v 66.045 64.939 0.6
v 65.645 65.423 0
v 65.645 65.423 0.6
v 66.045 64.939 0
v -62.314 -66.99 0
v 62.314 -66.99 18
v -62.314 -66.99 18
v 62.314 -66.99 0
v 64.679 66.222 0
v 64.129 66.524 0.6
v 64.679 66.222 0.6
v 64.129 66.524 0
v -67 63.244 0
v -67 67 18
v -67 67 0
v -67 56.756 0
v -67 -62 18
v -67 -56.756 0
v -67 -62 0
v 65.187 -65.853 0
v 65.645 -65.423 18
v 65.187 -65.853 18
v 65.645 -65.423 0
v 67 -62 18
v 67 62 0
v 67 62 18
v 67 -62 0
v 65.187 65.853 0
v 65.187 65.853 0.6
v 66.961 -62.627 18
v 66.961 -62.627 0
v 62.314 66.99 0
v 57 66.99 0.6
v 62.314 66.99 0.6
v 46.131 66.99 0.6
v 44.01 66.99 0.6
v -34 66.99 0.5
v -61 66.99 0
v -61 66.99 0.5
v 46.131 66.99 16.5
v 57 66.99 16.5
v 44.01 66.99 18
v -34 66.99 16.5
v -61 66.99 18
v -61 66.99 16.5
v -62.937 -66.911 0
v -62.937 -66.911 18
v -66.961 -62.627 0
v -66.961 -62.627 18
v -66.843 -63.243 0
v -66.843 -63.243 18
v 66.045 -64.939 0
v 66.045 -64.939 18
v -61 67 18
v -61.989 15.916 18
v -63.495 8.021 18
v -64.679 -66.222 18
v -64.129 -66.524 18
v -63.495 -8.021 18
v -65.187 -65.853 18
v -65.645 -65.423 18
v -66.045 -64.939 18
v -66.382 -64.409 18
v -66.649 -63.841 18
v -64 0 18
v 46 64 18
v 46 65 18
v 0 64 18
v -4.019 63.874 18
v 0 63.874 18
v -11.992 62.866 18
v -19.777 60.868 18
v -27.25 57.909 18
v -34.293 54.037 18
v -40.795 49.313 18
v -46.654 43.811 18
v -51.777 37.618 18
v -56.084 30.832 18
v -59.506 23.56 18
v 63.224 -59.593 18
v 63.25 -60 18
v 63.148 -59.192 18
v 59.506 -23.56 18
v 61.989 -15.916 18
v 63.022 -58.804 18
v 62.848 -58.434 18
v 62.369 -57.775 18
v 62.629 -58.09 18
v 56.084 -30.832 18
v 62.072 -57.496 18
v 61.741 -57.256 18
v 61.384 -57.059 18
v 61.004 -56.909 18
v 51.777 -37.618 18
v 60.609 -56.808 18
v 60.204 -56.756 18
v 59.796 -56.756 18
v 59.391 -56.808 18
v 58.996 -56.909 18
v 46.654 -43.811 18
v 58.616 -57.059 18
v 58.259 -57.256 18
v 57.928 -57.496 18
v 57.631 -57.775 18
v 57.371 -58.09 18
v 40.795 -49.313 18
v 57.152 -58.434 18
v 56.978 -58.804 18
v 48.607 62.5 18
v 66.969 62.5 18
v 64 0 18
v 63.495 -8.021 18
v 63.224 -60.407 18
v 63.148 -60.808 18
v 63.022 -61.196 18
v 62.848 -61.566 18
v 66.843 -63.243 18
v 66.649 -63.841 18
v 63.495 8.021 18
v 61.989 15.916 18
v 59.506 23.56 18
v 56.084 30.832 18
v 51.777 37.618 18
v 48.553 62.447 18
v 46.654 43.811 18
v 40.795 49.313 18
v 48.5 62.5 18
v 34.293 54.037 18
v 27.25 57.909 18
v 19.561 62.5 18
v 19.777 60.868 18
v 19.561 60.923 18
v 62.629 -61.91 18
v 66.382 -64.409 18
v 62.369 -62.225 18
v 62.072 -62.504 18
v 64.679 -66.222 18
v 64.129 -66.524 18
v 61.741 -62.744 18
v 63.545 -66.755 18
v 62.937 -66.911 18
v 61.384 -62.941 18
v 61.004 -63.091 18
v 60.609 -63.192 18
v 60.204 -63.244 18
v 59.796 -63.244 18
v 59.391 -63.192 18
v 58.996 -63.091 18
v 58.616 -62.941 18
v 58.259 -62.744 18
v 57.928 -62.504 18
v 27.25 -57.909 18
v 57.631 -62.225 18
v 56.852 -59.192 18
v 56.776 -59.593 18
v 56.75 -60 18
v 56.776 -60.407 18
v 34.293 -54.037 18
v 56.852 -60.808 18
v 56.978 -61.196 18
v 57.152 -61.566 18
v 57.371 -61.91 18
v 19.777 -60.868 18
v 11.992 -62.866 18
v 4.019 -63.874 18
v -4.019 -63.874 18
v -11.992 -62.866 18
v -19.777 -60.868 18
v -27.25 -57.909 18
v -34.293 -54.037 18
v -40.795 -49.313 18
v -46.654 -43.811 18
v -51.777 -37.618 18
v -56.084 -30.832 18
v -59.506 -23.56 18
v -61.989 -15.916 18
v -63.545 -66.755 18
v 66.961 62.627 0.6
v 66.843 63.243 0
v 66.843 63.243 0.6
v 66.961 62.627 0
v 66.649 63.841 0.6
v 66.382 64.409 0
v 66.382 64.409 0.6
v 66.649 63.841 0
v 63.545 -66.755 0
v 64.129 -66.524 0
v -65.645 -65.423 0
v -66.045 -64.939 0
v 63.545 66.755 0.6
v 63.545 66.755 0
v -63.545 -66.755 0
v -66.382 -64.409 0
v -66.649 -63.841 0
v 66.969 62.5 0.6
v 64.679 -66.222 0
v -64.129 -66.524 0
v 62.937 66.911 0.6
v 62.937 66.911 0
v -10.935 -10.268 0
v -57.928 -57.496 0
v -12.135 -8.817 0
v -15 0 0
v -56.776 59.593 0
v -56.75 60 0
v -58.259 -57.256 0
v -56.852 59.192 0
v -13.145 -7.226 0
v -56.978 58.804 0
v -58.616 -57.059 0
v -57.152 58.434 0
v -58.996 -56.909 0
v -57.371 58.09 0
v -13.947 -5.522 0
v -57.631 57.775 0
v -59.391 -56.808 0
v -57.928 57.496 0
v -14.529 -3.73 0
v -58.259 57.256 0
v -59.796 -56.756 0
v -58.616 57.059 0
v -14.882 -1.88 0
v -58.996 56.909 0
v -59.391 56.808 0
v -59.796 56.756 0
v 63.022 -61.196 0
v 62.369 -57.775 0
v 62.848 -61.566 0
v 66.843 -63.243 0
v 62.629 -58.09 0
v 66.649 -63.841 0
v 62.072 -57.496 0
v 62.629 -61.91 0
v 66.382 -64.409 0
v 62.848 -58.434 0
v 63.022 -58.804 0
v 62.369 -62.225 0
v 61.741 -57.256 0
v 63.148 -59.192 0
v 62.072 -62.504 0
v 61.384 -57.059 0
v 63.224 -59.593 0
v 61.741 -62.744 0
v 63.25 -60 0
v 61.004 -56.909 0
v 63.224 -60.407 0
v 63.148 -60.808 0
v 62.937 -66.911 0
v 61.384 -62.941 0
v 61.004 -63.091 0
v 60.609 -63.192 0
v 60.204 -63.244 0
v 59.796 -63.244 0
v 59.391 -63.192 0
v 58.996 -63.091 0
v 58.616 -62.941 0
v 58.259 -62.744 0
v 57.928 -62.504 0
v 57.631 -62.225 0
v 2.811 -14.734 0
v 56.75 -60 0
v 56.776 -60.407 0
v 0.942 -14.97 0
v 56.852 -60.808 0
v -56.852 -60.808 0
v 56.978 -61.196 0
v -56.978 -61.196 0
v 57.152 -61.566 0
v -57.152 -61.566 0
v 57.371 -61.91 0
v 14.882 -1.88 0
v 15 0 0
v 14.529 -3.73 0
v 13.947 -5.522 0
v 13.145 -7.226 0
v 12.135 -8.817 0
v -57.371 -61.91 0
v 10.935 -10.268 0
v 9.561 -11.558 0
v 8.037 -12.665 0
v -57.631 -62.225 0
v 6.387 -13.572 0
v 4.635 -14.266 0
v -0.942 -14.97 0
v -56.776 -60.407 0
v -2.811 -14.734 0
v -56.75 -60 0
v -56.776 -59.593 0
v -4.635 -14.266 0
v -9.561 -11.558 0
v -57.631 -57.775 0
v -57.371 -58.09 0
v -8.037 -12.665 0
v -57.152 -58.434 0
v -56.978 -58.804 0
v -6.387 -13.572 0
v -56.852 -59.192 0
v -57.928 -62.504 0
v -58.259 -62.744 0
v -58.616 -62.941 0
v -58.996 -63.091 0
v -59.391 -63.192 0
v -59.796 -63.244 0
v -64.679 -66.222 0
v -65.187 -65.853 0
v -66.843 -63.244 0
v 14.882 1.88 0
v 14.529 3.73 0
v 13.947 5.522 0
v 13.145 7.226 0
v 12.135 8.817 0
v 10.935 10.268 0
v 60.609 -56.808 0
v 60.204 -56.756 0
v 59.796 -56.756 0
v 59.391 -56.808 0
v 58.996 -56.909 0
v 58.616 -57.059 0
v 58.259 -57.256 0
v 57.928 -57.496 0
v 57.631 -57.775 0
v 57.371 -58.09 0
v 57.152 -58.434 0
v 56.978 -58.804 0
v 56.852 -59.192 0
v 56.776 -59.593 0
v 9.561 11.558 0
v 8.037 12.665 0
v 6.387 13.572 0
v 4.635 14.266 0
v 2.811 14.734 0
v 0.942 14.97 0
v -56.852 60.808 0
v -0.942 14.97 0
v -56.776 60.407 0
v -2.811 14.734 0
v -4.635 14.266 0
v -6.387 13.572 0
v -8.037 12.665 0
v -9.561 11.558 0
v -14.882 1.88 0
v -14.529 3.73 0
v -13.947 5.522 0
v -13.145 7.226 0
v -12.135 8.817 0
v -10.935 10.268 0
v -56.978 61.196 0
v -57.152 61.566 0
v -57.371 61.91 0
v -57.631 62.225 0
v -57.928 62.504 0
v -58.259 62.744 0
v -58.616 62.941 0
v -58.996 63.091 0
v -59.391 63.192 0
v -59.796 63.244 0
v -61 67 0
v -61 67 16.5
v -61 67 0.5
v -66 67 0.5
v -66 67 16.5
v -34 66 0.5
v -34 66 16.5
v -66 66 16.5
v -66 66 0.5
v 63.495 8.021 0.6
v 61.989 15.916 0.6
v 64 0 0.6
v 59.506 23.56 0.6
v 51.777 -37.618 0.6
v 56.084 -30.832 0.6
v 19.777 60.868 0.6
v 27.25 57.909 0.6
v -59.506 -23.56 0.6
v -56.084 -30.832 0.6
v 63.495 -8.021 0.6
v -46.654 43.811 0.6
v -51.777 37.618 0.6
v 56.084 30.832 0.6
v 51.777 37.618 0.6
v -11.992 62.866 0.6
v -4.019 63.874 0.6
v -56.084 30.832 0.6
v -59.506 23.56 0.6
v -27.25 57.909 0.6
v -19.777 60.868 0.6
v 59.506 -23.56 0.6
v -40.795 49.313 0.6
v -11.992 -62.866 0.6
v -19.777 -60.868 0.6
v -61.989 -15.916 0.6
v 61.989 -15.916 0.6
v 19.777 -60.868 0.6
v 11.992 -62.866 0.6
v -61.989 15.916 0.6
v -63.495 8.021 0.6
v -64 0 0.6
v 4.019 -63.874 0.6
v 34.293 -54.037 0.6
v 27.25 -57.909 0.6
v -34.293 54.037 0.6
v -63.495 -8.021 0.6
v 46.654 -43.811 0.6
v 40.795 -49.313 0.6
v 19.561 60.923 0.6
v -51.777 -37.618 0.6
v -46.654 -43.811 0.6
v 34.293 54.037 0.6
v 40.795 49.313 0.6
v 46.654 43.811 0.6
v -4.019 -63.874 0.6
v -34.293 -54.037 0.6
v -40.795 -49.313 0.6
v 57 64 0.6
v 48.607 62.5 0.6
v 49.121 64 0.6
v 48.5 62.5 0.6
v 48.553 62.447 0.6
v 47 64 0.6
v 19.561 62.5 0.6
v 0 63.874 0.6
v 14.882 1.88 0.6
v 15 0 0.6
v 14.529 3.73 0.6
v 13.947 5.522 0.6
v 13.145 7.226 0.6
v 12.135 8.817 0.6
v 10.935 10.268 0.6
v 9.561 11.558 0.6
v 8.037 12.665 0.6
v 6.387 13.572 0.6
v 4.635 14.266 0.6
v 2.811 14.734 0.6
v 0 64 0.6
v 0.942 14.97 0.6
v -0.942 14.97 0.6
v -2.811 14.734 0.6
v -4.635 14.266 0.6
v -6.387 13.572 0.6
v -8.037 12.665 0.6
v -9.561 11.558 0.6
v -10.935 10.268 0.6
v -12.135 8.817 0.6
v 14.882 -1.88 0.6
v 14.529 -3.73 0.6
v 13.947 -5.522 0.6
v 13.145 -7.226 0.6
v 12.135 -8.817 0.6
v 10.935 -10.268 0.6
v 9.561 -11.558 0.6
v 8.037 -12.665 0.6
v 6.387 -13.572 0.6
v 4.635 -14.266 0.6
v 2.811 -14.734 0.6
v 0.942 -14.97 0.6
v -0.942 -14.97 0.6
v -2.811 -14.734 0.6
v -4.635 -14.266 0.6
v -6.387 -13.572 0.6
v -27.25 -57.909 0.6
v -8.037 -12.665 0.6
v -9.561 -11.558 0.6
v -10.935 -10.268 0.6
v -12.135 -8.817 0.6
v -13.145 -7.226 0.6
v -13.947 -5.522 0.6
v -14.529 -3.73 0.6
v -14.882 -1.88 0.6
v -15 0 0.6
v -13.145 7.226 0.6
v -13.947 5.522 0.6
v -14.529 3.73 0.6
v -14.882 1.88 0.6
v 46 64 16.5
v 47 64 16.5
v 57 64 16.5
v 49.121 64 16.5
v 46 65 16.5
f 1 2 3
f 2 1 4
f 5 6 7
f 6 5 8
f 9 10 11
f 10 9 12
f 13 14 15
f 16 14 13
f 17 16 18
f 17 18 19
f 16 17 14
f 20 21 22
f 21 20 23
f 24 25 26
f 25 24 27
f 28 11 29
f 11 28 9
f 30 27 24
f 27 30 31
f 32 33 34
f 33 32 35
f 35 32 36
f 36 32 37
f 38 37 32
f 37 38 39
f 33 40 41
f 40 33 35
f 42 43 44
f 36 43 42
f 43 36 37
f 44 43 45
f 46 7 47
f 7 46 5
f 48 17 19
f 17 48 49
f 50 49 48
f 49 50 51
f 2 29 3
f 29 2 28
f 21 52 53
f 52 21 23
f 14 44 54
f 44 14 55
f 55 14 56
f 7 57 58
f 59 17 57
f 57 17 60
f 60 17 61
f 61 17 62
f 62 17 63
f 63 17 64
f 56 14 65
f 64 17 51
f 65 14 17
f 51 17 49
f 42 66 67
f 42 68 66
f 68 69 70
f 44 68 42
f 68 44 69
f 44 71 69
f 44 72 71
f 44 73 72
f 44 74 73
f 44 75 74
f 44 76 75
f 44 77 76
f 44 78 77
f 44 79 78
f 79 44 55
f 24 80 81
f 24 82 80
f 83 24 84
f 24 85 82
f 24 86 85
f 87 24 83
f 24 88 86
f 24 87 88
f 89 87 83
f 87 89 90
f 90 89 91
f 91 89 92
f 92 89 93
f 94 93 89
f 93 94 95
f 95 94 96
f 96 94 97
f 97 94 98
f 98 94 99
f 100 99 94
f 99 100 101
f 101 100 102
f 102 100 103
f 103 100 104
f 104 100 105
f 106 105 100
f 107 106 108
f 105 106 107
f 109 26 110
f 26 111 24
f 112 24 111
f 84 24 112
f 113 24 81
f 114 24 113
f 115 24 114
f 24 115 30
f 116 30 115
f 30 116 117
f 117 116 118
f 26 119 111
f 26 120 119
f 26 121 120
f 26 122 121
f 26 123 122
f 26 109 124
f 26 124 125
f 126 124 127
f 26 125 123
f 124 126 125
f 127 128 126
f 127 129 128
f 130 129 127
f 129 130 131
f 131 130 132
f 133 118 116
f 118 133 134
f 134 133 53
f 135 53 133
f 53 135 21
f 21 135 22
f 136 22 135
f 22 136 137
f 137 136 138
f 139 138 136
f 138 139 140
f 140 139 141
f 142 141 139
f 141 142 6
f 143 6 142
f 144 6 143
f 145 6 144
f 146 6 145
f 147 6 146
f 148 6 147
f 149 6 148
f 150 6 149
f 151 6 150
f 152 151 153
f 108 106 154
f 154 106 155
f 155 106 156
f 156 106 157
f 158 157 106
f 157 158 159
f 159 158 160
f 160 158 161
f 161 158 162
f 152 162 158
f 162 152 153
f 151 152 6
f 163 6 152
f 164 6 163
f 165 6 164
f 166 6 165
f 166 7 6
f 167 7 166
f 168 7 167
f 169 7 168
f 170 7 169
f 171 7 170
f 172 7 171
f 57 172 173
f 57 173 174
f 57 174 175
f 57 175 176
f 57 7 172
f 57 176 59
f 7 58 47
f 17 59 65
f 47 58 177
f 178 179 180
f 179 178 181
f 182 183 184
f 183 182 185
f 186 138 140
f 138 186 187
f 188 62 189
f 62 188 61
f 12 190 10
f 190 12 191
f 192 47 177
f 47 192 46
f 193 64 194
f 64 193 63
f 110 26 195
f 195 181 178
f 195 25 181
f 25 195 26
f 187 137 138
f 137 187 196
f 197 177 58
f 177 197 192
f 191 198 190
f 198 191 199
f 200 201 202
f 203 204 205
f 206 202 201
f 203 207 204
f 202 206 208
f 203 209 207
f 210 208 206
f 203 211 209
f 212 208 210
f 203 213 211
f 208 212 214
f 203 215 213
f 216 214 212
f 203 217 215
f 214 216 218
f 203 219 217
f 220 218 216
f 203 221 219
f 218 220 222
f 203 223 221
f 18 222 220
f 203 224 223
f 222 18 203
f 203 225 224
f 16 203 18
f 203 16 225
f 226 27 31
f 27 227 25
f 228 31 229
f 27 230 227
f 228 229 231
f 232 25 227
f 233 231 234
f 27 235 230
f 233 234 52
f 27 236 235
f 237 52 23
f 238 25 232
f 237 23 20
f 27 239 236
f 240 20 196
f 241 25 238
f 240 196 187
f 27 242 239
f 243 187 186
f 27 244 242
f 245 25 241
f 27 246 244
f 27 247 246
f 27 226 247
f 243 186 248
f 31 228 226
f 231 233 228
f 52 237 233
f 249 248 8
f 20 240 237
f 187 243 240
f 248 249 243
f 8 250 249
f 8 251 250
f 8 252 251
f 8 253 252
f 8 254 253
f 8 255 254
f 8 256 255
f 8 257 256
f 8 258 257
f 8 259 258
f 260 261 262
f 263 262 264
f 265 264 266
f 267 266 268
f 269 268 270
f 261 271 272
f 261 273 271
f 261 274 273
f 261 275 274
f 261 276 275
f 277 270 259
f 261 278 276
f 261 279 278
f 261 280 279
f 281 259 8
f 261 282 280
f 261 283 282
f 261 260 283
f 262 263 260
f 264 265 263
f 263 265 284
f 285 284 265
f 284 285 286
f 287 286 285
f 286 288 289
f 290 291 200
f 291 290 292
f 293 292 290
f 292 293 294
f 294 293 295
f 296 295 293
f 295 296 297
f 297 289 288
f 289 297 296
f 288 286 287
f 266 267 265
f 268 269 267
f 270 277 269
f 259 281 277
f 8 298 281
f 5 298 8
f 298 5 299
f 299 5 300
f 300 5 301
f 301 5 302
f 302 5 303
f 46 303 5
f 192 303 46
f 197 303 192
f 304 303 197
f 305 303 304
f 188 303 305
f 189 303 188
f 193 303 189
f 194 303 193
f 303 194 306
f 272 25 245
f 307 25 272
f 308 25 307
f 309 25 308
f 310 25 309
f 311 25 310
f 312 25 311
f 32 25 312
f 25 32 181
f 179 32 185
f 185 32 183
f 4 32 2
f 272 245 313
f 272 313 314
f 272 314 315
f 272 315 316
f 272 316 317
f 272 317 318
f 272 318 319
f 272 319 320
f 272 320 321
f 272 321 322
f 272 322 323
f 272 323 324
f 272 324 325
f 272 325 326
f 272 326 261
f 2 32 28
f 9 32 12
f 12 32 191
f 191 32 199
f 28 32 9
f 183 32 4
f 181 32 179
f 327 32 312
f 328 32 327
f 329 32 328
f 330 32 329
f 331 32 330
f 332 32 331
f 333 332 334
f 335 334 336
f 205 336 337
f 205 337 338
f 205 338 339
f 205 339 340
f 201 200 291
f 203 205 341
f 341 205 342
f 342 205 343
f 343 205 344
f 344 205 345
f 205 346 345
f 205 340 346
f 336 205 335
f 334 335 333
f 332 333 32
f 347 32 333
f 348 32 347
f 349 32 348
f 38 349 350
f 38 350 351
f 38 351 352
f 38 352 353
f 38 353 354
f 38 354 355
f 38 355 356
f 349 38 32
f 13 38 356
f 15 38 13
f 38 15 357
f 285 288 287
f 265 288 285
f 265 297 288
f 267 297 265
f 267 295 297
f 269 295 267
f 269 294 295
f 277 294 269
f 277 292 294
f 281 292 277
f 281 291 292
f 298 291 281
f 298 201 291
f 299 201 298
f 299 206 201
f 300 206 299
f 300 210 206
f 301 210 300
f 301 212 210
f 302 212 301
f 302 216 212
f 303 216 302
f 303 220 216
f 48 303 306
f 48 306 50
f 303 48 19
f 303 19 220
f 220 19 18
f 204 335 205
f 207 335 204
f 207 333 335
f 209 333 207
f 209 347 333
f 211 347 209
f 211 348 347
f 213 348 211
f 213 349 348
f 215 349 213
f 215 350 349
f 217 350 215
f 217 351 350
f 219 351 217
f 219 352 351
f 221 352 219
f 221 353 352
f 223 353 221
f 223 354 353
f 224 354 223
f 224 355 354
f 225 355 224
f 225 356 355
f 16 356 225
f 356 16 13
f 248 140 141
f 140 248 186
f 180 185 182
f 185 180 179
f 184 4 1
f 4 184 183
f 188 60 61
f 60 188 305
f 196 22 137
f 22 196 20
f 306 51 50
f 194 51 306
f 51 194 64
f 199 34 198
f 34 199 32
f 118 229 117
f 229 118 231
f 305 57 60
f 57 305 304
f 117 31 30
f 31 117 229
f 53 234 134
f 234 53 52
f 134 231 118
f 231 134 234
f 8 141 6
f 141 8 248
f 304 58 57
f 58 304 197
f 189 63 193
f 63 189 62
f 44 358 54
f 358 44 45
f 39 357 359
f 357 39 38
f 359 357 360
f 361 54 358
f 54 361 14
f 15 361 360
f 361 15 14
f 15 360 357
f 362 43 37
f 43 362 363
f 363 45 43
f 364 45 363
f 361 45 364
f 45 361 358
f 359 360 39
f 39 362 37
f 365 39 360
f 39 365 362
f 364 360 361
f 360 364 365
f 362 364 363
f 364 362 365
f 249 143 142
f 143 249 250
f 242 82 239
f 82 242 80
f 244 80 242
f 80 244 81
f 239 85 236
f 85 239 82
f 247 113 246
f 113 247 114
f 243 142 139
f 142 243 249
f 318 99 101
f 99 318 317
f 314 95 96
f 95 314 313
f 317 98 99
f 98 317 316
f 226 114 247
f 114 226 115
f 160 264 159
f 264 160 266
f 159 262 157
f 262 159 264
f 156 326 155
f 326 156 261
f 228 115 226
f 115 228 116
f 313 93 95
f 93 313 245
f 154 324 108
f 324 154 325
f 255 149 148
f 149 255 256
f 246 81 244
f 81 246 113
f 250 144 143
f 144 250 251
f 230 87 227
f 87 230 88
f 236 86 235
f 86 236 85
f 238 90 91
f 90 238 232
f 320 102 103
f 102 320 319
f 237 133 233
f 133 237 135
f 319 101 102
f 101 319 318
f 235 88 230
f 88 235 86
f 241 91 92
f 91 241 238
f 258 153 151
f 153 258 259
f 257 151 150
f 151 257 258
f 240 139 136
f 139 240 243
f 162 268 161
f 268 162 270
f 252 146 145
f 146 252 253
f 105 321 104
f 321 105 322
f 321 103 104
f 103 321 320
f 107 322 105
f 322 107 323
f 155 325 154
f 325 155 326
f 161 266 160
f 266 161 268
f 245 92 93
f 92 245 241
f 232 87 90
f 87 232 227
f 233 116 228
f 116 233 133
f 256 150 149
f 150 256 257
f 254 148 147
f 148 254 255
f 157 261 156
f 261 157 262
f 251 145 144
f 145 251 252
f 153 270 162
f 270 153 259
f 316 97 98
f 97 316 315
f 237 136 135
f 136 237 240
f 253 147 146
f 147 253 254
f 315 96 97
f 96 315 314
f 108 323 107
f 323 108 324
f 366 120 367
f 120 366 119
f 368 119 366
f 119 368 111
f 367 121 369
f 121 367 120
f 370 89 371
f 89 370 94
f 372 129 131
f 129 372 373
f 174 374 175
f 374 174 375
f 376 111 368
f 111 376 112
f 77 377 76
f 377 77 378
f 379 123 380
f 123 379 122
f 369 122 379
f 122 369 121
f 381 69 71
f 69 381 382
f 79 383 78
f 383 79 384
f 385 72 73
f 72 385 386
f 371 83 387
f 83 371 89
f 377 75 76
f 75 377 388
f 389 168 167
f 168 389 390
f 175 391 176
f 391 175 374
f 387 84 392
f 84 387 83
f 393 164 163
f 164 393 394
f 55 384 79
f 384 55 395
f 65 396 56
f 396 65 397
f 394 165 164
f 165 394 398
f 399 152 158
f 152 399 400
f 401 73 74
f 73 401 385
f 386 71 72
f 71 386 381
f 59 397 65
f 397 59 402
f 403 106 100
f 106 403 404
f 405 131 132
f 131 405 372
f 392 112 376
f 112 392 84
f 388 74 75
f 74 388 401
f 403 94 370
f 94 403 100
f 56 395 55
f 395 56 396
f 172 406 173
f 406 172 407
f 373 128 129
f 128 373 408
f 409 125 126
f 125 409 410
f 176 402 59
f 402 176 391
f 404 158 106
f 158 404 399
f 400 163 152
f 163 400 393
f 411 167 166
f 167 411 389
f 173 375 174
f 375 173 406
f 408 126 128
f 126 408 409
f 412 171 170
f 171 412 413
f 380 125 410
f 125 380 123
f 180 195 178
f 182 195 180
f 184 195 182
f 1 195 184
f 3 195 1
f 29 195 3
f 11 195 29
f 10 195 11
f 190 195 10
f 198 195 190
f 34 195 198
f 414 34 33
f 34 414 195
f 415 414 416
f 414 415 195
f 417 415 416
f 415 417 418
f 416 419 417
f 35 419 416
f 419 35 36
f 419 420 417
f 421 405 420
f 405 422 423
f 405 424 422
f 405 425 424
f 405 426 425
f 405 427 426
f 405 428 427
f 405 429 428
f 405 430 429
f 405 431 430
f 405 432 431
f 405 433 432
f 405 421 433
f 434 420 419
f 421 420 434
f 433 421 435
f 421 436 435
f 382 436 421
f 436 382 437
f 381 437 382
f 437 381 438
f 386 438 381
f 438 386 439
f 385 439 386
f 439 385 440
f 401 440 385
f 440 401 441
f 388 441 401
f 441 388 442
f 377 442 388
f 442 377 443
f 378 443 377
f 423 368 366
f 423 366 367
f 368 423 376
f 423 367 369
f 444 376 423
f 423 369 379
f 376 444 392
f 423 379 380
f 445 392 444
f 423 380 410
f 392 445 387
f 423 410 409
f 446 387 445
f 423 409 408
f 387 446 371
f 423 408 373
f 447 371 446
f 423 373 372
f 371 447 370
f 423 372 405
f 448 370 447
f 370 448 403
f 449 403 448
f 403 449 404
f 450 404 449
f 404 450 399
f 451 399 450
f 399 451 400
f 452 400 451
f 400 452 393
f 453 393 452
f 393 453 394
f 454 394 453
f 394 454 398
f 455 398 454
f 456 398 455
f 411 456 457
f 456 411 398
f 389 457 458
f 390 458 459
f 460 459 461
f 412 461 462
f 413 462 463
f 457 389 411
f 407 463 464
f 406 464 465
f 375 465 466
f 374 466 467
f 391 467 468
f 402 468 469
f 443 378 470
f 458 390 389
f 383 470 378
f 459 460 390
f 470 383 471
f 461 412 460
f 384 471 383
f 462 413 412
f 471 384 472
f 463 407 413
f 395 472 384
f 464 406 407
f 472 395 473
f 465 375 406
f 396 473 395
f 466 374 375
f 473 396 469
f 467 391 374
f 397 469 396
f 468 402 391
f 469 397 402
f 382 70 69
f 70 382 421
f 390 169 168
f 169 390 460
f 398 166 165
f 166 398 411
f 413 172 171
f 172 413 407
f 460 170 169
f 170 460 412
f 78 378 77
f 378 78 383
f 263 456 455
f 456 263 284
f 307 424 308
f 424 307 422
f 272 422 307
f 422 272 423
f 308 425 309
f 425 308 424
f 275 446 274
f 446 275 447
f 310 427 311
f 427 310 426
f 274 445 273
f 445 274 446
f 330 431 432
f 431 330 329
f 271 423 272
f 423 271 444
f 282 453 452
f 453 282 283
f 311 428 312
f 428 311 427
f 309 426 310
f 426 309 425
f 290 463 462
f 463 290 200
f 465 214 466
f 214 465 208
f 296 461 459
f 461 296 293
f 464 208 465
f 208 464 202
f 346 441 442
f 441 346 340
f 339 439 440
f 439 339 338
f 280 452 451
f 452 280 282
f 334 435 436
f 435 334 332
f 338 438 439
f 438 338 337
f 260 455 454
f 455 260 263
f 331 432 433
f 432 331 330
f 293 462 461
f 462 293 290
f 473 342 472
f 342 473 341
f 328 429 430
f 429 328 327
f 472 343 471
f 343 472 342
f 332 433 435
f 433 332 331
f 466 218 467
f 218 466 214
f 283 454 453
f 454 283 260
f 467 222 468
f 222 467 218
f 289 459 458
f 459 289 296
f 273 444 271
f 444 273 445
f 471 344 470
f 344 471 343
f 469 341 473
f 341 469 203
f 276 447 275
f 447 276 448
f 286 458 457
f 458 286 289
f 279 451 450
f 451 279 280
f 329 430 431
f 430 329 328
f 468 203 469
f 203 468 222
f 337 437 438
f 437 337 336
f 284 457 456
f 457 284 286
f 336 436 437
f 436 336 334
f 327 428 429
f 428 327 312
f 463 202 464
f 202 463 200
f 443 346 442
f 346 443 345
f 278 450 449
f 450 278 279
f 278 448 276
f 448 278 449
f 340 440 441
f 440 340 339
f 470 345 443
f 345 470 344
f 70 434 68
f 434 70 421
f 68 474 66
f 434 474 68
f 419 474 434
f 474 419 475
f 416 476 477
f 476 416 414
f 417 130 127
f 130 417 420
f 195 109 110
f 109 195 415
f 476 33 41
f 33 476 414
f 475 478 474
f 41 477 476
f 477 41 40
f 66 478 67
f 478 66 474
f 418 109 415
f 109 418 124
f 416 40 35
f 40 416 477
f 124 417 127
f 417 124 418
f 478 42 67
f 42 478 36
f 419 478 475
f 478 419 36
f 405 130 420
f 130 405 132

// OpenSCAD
$fn = 50;


difference() {
	union() {
		hull() {
			translate(v = [-62.0000000000, 62.0000000000, 0]) {
				cylinder(h = 18, r = 5);
			}
			translate(v = [62.0000000000, 62.0000000000, 0]) {
				cylinder(h = 18, r = 5);
			}
			translate(v = [-62.0000000000, -62.0000000000, 0]) {
				cylinder(h = 18, r = 5);
			}
			translate(v = [62.0000000000, -62.0000000000, 0]) {
				cylinder(h = 18, r = 5);
			}
		}
		translate(v = [-67.0000000000, 61.0000000000, 0]) {
			cube(size = [6, 6, 18]);
		}
	}
	union() {
		translate(v = [-67.5000000000, -60.0000000000, -250.0000000000]) {
			rotate(a = [0, 0, 0]) {
				difference() {
					union() {
						hull() {
							translate(v = [7.5000000000, 0, 0]) {
								cylinder(h = 250, r = 3.2500000000, r1 = 3.2500000000, r2 = 3.2500000000);
							}
							translate(v = [-7.5000000000, 0, 0]) {
								cylinder(h = 250, r = 3.2500000000, r1 = 3.2500000000, r2 = 3.2500000000);
							}
						}
					}
					union();
				}
			}
		}
		translate(v = [-67.5000000000, 60.0000000000, -250.0000000000]) {
			rotate(a = [0, 0, 0]) {
				difference() {
					union() {
						hull() {
							translate(v = [7.5000000000, 0, 0]) {
								cylinder(h = 250, r = 3.2500000000, r1 = 3.2500000000, r2 = 3.2500000000);
							}
							translate(v = [-7.5000000000, 0, 0]) {
								cylinder(h = 250, r = 3.2500000000, r1 = 3.2500000000, r2 = 3.2500000000);
							}
						}
					}
					union();
				}
			}
		}
		translate(v = [-66.0000000000, 66.0000000000, 0.5000000000]) {
			cube(size = [32, 1, 16]);
		}
		translate(v = [60.0000000000, -60.0000000000, -50.0000000000]) {
			cylinder(h = 100, r = 3.2500000000);
		}
		translate(v = [0, 0, 0.6000000000]) {
			cylinder(h = 20.4000000000, r = 64.0000000000);
		}
		translate(v = [0, 0, -9.0000000000]) {
			cylinder(h = 18, r = 15.0000000000);
		}
		translate(v = [0.0000000000, 62.5000000000, 0.6000000000]) {
			cube(size = [67.0000000000, 1.5000000000, 20.4000000000]);
		}
		translate(v = [57.0000000000, 62.5000000000, 0.6000000000]) {
			cube(size = [10, 4.5000000000, 20.4000000000]);
		}
		translate(v = [46.0000000000, 62.5000000000, 16.5000000000]) {
			cube(size = [21, 4.5000000000, 1.5000000000]);
		}
		translate(v = [43.2500000000, 67.7500000000, 0.6000000000]) {
			rotate(a = [0, 0, -45]) {
				cube(size = [7.5000000000, 1.5000000000, 20.4000000000]);
			}
		}
		translate(v = [12.0610000000, 60.5000000000, 0.6000000000]) {
			cube(size = [7.5000000000, 2, 17.4000000000]);
		}
	}
}
